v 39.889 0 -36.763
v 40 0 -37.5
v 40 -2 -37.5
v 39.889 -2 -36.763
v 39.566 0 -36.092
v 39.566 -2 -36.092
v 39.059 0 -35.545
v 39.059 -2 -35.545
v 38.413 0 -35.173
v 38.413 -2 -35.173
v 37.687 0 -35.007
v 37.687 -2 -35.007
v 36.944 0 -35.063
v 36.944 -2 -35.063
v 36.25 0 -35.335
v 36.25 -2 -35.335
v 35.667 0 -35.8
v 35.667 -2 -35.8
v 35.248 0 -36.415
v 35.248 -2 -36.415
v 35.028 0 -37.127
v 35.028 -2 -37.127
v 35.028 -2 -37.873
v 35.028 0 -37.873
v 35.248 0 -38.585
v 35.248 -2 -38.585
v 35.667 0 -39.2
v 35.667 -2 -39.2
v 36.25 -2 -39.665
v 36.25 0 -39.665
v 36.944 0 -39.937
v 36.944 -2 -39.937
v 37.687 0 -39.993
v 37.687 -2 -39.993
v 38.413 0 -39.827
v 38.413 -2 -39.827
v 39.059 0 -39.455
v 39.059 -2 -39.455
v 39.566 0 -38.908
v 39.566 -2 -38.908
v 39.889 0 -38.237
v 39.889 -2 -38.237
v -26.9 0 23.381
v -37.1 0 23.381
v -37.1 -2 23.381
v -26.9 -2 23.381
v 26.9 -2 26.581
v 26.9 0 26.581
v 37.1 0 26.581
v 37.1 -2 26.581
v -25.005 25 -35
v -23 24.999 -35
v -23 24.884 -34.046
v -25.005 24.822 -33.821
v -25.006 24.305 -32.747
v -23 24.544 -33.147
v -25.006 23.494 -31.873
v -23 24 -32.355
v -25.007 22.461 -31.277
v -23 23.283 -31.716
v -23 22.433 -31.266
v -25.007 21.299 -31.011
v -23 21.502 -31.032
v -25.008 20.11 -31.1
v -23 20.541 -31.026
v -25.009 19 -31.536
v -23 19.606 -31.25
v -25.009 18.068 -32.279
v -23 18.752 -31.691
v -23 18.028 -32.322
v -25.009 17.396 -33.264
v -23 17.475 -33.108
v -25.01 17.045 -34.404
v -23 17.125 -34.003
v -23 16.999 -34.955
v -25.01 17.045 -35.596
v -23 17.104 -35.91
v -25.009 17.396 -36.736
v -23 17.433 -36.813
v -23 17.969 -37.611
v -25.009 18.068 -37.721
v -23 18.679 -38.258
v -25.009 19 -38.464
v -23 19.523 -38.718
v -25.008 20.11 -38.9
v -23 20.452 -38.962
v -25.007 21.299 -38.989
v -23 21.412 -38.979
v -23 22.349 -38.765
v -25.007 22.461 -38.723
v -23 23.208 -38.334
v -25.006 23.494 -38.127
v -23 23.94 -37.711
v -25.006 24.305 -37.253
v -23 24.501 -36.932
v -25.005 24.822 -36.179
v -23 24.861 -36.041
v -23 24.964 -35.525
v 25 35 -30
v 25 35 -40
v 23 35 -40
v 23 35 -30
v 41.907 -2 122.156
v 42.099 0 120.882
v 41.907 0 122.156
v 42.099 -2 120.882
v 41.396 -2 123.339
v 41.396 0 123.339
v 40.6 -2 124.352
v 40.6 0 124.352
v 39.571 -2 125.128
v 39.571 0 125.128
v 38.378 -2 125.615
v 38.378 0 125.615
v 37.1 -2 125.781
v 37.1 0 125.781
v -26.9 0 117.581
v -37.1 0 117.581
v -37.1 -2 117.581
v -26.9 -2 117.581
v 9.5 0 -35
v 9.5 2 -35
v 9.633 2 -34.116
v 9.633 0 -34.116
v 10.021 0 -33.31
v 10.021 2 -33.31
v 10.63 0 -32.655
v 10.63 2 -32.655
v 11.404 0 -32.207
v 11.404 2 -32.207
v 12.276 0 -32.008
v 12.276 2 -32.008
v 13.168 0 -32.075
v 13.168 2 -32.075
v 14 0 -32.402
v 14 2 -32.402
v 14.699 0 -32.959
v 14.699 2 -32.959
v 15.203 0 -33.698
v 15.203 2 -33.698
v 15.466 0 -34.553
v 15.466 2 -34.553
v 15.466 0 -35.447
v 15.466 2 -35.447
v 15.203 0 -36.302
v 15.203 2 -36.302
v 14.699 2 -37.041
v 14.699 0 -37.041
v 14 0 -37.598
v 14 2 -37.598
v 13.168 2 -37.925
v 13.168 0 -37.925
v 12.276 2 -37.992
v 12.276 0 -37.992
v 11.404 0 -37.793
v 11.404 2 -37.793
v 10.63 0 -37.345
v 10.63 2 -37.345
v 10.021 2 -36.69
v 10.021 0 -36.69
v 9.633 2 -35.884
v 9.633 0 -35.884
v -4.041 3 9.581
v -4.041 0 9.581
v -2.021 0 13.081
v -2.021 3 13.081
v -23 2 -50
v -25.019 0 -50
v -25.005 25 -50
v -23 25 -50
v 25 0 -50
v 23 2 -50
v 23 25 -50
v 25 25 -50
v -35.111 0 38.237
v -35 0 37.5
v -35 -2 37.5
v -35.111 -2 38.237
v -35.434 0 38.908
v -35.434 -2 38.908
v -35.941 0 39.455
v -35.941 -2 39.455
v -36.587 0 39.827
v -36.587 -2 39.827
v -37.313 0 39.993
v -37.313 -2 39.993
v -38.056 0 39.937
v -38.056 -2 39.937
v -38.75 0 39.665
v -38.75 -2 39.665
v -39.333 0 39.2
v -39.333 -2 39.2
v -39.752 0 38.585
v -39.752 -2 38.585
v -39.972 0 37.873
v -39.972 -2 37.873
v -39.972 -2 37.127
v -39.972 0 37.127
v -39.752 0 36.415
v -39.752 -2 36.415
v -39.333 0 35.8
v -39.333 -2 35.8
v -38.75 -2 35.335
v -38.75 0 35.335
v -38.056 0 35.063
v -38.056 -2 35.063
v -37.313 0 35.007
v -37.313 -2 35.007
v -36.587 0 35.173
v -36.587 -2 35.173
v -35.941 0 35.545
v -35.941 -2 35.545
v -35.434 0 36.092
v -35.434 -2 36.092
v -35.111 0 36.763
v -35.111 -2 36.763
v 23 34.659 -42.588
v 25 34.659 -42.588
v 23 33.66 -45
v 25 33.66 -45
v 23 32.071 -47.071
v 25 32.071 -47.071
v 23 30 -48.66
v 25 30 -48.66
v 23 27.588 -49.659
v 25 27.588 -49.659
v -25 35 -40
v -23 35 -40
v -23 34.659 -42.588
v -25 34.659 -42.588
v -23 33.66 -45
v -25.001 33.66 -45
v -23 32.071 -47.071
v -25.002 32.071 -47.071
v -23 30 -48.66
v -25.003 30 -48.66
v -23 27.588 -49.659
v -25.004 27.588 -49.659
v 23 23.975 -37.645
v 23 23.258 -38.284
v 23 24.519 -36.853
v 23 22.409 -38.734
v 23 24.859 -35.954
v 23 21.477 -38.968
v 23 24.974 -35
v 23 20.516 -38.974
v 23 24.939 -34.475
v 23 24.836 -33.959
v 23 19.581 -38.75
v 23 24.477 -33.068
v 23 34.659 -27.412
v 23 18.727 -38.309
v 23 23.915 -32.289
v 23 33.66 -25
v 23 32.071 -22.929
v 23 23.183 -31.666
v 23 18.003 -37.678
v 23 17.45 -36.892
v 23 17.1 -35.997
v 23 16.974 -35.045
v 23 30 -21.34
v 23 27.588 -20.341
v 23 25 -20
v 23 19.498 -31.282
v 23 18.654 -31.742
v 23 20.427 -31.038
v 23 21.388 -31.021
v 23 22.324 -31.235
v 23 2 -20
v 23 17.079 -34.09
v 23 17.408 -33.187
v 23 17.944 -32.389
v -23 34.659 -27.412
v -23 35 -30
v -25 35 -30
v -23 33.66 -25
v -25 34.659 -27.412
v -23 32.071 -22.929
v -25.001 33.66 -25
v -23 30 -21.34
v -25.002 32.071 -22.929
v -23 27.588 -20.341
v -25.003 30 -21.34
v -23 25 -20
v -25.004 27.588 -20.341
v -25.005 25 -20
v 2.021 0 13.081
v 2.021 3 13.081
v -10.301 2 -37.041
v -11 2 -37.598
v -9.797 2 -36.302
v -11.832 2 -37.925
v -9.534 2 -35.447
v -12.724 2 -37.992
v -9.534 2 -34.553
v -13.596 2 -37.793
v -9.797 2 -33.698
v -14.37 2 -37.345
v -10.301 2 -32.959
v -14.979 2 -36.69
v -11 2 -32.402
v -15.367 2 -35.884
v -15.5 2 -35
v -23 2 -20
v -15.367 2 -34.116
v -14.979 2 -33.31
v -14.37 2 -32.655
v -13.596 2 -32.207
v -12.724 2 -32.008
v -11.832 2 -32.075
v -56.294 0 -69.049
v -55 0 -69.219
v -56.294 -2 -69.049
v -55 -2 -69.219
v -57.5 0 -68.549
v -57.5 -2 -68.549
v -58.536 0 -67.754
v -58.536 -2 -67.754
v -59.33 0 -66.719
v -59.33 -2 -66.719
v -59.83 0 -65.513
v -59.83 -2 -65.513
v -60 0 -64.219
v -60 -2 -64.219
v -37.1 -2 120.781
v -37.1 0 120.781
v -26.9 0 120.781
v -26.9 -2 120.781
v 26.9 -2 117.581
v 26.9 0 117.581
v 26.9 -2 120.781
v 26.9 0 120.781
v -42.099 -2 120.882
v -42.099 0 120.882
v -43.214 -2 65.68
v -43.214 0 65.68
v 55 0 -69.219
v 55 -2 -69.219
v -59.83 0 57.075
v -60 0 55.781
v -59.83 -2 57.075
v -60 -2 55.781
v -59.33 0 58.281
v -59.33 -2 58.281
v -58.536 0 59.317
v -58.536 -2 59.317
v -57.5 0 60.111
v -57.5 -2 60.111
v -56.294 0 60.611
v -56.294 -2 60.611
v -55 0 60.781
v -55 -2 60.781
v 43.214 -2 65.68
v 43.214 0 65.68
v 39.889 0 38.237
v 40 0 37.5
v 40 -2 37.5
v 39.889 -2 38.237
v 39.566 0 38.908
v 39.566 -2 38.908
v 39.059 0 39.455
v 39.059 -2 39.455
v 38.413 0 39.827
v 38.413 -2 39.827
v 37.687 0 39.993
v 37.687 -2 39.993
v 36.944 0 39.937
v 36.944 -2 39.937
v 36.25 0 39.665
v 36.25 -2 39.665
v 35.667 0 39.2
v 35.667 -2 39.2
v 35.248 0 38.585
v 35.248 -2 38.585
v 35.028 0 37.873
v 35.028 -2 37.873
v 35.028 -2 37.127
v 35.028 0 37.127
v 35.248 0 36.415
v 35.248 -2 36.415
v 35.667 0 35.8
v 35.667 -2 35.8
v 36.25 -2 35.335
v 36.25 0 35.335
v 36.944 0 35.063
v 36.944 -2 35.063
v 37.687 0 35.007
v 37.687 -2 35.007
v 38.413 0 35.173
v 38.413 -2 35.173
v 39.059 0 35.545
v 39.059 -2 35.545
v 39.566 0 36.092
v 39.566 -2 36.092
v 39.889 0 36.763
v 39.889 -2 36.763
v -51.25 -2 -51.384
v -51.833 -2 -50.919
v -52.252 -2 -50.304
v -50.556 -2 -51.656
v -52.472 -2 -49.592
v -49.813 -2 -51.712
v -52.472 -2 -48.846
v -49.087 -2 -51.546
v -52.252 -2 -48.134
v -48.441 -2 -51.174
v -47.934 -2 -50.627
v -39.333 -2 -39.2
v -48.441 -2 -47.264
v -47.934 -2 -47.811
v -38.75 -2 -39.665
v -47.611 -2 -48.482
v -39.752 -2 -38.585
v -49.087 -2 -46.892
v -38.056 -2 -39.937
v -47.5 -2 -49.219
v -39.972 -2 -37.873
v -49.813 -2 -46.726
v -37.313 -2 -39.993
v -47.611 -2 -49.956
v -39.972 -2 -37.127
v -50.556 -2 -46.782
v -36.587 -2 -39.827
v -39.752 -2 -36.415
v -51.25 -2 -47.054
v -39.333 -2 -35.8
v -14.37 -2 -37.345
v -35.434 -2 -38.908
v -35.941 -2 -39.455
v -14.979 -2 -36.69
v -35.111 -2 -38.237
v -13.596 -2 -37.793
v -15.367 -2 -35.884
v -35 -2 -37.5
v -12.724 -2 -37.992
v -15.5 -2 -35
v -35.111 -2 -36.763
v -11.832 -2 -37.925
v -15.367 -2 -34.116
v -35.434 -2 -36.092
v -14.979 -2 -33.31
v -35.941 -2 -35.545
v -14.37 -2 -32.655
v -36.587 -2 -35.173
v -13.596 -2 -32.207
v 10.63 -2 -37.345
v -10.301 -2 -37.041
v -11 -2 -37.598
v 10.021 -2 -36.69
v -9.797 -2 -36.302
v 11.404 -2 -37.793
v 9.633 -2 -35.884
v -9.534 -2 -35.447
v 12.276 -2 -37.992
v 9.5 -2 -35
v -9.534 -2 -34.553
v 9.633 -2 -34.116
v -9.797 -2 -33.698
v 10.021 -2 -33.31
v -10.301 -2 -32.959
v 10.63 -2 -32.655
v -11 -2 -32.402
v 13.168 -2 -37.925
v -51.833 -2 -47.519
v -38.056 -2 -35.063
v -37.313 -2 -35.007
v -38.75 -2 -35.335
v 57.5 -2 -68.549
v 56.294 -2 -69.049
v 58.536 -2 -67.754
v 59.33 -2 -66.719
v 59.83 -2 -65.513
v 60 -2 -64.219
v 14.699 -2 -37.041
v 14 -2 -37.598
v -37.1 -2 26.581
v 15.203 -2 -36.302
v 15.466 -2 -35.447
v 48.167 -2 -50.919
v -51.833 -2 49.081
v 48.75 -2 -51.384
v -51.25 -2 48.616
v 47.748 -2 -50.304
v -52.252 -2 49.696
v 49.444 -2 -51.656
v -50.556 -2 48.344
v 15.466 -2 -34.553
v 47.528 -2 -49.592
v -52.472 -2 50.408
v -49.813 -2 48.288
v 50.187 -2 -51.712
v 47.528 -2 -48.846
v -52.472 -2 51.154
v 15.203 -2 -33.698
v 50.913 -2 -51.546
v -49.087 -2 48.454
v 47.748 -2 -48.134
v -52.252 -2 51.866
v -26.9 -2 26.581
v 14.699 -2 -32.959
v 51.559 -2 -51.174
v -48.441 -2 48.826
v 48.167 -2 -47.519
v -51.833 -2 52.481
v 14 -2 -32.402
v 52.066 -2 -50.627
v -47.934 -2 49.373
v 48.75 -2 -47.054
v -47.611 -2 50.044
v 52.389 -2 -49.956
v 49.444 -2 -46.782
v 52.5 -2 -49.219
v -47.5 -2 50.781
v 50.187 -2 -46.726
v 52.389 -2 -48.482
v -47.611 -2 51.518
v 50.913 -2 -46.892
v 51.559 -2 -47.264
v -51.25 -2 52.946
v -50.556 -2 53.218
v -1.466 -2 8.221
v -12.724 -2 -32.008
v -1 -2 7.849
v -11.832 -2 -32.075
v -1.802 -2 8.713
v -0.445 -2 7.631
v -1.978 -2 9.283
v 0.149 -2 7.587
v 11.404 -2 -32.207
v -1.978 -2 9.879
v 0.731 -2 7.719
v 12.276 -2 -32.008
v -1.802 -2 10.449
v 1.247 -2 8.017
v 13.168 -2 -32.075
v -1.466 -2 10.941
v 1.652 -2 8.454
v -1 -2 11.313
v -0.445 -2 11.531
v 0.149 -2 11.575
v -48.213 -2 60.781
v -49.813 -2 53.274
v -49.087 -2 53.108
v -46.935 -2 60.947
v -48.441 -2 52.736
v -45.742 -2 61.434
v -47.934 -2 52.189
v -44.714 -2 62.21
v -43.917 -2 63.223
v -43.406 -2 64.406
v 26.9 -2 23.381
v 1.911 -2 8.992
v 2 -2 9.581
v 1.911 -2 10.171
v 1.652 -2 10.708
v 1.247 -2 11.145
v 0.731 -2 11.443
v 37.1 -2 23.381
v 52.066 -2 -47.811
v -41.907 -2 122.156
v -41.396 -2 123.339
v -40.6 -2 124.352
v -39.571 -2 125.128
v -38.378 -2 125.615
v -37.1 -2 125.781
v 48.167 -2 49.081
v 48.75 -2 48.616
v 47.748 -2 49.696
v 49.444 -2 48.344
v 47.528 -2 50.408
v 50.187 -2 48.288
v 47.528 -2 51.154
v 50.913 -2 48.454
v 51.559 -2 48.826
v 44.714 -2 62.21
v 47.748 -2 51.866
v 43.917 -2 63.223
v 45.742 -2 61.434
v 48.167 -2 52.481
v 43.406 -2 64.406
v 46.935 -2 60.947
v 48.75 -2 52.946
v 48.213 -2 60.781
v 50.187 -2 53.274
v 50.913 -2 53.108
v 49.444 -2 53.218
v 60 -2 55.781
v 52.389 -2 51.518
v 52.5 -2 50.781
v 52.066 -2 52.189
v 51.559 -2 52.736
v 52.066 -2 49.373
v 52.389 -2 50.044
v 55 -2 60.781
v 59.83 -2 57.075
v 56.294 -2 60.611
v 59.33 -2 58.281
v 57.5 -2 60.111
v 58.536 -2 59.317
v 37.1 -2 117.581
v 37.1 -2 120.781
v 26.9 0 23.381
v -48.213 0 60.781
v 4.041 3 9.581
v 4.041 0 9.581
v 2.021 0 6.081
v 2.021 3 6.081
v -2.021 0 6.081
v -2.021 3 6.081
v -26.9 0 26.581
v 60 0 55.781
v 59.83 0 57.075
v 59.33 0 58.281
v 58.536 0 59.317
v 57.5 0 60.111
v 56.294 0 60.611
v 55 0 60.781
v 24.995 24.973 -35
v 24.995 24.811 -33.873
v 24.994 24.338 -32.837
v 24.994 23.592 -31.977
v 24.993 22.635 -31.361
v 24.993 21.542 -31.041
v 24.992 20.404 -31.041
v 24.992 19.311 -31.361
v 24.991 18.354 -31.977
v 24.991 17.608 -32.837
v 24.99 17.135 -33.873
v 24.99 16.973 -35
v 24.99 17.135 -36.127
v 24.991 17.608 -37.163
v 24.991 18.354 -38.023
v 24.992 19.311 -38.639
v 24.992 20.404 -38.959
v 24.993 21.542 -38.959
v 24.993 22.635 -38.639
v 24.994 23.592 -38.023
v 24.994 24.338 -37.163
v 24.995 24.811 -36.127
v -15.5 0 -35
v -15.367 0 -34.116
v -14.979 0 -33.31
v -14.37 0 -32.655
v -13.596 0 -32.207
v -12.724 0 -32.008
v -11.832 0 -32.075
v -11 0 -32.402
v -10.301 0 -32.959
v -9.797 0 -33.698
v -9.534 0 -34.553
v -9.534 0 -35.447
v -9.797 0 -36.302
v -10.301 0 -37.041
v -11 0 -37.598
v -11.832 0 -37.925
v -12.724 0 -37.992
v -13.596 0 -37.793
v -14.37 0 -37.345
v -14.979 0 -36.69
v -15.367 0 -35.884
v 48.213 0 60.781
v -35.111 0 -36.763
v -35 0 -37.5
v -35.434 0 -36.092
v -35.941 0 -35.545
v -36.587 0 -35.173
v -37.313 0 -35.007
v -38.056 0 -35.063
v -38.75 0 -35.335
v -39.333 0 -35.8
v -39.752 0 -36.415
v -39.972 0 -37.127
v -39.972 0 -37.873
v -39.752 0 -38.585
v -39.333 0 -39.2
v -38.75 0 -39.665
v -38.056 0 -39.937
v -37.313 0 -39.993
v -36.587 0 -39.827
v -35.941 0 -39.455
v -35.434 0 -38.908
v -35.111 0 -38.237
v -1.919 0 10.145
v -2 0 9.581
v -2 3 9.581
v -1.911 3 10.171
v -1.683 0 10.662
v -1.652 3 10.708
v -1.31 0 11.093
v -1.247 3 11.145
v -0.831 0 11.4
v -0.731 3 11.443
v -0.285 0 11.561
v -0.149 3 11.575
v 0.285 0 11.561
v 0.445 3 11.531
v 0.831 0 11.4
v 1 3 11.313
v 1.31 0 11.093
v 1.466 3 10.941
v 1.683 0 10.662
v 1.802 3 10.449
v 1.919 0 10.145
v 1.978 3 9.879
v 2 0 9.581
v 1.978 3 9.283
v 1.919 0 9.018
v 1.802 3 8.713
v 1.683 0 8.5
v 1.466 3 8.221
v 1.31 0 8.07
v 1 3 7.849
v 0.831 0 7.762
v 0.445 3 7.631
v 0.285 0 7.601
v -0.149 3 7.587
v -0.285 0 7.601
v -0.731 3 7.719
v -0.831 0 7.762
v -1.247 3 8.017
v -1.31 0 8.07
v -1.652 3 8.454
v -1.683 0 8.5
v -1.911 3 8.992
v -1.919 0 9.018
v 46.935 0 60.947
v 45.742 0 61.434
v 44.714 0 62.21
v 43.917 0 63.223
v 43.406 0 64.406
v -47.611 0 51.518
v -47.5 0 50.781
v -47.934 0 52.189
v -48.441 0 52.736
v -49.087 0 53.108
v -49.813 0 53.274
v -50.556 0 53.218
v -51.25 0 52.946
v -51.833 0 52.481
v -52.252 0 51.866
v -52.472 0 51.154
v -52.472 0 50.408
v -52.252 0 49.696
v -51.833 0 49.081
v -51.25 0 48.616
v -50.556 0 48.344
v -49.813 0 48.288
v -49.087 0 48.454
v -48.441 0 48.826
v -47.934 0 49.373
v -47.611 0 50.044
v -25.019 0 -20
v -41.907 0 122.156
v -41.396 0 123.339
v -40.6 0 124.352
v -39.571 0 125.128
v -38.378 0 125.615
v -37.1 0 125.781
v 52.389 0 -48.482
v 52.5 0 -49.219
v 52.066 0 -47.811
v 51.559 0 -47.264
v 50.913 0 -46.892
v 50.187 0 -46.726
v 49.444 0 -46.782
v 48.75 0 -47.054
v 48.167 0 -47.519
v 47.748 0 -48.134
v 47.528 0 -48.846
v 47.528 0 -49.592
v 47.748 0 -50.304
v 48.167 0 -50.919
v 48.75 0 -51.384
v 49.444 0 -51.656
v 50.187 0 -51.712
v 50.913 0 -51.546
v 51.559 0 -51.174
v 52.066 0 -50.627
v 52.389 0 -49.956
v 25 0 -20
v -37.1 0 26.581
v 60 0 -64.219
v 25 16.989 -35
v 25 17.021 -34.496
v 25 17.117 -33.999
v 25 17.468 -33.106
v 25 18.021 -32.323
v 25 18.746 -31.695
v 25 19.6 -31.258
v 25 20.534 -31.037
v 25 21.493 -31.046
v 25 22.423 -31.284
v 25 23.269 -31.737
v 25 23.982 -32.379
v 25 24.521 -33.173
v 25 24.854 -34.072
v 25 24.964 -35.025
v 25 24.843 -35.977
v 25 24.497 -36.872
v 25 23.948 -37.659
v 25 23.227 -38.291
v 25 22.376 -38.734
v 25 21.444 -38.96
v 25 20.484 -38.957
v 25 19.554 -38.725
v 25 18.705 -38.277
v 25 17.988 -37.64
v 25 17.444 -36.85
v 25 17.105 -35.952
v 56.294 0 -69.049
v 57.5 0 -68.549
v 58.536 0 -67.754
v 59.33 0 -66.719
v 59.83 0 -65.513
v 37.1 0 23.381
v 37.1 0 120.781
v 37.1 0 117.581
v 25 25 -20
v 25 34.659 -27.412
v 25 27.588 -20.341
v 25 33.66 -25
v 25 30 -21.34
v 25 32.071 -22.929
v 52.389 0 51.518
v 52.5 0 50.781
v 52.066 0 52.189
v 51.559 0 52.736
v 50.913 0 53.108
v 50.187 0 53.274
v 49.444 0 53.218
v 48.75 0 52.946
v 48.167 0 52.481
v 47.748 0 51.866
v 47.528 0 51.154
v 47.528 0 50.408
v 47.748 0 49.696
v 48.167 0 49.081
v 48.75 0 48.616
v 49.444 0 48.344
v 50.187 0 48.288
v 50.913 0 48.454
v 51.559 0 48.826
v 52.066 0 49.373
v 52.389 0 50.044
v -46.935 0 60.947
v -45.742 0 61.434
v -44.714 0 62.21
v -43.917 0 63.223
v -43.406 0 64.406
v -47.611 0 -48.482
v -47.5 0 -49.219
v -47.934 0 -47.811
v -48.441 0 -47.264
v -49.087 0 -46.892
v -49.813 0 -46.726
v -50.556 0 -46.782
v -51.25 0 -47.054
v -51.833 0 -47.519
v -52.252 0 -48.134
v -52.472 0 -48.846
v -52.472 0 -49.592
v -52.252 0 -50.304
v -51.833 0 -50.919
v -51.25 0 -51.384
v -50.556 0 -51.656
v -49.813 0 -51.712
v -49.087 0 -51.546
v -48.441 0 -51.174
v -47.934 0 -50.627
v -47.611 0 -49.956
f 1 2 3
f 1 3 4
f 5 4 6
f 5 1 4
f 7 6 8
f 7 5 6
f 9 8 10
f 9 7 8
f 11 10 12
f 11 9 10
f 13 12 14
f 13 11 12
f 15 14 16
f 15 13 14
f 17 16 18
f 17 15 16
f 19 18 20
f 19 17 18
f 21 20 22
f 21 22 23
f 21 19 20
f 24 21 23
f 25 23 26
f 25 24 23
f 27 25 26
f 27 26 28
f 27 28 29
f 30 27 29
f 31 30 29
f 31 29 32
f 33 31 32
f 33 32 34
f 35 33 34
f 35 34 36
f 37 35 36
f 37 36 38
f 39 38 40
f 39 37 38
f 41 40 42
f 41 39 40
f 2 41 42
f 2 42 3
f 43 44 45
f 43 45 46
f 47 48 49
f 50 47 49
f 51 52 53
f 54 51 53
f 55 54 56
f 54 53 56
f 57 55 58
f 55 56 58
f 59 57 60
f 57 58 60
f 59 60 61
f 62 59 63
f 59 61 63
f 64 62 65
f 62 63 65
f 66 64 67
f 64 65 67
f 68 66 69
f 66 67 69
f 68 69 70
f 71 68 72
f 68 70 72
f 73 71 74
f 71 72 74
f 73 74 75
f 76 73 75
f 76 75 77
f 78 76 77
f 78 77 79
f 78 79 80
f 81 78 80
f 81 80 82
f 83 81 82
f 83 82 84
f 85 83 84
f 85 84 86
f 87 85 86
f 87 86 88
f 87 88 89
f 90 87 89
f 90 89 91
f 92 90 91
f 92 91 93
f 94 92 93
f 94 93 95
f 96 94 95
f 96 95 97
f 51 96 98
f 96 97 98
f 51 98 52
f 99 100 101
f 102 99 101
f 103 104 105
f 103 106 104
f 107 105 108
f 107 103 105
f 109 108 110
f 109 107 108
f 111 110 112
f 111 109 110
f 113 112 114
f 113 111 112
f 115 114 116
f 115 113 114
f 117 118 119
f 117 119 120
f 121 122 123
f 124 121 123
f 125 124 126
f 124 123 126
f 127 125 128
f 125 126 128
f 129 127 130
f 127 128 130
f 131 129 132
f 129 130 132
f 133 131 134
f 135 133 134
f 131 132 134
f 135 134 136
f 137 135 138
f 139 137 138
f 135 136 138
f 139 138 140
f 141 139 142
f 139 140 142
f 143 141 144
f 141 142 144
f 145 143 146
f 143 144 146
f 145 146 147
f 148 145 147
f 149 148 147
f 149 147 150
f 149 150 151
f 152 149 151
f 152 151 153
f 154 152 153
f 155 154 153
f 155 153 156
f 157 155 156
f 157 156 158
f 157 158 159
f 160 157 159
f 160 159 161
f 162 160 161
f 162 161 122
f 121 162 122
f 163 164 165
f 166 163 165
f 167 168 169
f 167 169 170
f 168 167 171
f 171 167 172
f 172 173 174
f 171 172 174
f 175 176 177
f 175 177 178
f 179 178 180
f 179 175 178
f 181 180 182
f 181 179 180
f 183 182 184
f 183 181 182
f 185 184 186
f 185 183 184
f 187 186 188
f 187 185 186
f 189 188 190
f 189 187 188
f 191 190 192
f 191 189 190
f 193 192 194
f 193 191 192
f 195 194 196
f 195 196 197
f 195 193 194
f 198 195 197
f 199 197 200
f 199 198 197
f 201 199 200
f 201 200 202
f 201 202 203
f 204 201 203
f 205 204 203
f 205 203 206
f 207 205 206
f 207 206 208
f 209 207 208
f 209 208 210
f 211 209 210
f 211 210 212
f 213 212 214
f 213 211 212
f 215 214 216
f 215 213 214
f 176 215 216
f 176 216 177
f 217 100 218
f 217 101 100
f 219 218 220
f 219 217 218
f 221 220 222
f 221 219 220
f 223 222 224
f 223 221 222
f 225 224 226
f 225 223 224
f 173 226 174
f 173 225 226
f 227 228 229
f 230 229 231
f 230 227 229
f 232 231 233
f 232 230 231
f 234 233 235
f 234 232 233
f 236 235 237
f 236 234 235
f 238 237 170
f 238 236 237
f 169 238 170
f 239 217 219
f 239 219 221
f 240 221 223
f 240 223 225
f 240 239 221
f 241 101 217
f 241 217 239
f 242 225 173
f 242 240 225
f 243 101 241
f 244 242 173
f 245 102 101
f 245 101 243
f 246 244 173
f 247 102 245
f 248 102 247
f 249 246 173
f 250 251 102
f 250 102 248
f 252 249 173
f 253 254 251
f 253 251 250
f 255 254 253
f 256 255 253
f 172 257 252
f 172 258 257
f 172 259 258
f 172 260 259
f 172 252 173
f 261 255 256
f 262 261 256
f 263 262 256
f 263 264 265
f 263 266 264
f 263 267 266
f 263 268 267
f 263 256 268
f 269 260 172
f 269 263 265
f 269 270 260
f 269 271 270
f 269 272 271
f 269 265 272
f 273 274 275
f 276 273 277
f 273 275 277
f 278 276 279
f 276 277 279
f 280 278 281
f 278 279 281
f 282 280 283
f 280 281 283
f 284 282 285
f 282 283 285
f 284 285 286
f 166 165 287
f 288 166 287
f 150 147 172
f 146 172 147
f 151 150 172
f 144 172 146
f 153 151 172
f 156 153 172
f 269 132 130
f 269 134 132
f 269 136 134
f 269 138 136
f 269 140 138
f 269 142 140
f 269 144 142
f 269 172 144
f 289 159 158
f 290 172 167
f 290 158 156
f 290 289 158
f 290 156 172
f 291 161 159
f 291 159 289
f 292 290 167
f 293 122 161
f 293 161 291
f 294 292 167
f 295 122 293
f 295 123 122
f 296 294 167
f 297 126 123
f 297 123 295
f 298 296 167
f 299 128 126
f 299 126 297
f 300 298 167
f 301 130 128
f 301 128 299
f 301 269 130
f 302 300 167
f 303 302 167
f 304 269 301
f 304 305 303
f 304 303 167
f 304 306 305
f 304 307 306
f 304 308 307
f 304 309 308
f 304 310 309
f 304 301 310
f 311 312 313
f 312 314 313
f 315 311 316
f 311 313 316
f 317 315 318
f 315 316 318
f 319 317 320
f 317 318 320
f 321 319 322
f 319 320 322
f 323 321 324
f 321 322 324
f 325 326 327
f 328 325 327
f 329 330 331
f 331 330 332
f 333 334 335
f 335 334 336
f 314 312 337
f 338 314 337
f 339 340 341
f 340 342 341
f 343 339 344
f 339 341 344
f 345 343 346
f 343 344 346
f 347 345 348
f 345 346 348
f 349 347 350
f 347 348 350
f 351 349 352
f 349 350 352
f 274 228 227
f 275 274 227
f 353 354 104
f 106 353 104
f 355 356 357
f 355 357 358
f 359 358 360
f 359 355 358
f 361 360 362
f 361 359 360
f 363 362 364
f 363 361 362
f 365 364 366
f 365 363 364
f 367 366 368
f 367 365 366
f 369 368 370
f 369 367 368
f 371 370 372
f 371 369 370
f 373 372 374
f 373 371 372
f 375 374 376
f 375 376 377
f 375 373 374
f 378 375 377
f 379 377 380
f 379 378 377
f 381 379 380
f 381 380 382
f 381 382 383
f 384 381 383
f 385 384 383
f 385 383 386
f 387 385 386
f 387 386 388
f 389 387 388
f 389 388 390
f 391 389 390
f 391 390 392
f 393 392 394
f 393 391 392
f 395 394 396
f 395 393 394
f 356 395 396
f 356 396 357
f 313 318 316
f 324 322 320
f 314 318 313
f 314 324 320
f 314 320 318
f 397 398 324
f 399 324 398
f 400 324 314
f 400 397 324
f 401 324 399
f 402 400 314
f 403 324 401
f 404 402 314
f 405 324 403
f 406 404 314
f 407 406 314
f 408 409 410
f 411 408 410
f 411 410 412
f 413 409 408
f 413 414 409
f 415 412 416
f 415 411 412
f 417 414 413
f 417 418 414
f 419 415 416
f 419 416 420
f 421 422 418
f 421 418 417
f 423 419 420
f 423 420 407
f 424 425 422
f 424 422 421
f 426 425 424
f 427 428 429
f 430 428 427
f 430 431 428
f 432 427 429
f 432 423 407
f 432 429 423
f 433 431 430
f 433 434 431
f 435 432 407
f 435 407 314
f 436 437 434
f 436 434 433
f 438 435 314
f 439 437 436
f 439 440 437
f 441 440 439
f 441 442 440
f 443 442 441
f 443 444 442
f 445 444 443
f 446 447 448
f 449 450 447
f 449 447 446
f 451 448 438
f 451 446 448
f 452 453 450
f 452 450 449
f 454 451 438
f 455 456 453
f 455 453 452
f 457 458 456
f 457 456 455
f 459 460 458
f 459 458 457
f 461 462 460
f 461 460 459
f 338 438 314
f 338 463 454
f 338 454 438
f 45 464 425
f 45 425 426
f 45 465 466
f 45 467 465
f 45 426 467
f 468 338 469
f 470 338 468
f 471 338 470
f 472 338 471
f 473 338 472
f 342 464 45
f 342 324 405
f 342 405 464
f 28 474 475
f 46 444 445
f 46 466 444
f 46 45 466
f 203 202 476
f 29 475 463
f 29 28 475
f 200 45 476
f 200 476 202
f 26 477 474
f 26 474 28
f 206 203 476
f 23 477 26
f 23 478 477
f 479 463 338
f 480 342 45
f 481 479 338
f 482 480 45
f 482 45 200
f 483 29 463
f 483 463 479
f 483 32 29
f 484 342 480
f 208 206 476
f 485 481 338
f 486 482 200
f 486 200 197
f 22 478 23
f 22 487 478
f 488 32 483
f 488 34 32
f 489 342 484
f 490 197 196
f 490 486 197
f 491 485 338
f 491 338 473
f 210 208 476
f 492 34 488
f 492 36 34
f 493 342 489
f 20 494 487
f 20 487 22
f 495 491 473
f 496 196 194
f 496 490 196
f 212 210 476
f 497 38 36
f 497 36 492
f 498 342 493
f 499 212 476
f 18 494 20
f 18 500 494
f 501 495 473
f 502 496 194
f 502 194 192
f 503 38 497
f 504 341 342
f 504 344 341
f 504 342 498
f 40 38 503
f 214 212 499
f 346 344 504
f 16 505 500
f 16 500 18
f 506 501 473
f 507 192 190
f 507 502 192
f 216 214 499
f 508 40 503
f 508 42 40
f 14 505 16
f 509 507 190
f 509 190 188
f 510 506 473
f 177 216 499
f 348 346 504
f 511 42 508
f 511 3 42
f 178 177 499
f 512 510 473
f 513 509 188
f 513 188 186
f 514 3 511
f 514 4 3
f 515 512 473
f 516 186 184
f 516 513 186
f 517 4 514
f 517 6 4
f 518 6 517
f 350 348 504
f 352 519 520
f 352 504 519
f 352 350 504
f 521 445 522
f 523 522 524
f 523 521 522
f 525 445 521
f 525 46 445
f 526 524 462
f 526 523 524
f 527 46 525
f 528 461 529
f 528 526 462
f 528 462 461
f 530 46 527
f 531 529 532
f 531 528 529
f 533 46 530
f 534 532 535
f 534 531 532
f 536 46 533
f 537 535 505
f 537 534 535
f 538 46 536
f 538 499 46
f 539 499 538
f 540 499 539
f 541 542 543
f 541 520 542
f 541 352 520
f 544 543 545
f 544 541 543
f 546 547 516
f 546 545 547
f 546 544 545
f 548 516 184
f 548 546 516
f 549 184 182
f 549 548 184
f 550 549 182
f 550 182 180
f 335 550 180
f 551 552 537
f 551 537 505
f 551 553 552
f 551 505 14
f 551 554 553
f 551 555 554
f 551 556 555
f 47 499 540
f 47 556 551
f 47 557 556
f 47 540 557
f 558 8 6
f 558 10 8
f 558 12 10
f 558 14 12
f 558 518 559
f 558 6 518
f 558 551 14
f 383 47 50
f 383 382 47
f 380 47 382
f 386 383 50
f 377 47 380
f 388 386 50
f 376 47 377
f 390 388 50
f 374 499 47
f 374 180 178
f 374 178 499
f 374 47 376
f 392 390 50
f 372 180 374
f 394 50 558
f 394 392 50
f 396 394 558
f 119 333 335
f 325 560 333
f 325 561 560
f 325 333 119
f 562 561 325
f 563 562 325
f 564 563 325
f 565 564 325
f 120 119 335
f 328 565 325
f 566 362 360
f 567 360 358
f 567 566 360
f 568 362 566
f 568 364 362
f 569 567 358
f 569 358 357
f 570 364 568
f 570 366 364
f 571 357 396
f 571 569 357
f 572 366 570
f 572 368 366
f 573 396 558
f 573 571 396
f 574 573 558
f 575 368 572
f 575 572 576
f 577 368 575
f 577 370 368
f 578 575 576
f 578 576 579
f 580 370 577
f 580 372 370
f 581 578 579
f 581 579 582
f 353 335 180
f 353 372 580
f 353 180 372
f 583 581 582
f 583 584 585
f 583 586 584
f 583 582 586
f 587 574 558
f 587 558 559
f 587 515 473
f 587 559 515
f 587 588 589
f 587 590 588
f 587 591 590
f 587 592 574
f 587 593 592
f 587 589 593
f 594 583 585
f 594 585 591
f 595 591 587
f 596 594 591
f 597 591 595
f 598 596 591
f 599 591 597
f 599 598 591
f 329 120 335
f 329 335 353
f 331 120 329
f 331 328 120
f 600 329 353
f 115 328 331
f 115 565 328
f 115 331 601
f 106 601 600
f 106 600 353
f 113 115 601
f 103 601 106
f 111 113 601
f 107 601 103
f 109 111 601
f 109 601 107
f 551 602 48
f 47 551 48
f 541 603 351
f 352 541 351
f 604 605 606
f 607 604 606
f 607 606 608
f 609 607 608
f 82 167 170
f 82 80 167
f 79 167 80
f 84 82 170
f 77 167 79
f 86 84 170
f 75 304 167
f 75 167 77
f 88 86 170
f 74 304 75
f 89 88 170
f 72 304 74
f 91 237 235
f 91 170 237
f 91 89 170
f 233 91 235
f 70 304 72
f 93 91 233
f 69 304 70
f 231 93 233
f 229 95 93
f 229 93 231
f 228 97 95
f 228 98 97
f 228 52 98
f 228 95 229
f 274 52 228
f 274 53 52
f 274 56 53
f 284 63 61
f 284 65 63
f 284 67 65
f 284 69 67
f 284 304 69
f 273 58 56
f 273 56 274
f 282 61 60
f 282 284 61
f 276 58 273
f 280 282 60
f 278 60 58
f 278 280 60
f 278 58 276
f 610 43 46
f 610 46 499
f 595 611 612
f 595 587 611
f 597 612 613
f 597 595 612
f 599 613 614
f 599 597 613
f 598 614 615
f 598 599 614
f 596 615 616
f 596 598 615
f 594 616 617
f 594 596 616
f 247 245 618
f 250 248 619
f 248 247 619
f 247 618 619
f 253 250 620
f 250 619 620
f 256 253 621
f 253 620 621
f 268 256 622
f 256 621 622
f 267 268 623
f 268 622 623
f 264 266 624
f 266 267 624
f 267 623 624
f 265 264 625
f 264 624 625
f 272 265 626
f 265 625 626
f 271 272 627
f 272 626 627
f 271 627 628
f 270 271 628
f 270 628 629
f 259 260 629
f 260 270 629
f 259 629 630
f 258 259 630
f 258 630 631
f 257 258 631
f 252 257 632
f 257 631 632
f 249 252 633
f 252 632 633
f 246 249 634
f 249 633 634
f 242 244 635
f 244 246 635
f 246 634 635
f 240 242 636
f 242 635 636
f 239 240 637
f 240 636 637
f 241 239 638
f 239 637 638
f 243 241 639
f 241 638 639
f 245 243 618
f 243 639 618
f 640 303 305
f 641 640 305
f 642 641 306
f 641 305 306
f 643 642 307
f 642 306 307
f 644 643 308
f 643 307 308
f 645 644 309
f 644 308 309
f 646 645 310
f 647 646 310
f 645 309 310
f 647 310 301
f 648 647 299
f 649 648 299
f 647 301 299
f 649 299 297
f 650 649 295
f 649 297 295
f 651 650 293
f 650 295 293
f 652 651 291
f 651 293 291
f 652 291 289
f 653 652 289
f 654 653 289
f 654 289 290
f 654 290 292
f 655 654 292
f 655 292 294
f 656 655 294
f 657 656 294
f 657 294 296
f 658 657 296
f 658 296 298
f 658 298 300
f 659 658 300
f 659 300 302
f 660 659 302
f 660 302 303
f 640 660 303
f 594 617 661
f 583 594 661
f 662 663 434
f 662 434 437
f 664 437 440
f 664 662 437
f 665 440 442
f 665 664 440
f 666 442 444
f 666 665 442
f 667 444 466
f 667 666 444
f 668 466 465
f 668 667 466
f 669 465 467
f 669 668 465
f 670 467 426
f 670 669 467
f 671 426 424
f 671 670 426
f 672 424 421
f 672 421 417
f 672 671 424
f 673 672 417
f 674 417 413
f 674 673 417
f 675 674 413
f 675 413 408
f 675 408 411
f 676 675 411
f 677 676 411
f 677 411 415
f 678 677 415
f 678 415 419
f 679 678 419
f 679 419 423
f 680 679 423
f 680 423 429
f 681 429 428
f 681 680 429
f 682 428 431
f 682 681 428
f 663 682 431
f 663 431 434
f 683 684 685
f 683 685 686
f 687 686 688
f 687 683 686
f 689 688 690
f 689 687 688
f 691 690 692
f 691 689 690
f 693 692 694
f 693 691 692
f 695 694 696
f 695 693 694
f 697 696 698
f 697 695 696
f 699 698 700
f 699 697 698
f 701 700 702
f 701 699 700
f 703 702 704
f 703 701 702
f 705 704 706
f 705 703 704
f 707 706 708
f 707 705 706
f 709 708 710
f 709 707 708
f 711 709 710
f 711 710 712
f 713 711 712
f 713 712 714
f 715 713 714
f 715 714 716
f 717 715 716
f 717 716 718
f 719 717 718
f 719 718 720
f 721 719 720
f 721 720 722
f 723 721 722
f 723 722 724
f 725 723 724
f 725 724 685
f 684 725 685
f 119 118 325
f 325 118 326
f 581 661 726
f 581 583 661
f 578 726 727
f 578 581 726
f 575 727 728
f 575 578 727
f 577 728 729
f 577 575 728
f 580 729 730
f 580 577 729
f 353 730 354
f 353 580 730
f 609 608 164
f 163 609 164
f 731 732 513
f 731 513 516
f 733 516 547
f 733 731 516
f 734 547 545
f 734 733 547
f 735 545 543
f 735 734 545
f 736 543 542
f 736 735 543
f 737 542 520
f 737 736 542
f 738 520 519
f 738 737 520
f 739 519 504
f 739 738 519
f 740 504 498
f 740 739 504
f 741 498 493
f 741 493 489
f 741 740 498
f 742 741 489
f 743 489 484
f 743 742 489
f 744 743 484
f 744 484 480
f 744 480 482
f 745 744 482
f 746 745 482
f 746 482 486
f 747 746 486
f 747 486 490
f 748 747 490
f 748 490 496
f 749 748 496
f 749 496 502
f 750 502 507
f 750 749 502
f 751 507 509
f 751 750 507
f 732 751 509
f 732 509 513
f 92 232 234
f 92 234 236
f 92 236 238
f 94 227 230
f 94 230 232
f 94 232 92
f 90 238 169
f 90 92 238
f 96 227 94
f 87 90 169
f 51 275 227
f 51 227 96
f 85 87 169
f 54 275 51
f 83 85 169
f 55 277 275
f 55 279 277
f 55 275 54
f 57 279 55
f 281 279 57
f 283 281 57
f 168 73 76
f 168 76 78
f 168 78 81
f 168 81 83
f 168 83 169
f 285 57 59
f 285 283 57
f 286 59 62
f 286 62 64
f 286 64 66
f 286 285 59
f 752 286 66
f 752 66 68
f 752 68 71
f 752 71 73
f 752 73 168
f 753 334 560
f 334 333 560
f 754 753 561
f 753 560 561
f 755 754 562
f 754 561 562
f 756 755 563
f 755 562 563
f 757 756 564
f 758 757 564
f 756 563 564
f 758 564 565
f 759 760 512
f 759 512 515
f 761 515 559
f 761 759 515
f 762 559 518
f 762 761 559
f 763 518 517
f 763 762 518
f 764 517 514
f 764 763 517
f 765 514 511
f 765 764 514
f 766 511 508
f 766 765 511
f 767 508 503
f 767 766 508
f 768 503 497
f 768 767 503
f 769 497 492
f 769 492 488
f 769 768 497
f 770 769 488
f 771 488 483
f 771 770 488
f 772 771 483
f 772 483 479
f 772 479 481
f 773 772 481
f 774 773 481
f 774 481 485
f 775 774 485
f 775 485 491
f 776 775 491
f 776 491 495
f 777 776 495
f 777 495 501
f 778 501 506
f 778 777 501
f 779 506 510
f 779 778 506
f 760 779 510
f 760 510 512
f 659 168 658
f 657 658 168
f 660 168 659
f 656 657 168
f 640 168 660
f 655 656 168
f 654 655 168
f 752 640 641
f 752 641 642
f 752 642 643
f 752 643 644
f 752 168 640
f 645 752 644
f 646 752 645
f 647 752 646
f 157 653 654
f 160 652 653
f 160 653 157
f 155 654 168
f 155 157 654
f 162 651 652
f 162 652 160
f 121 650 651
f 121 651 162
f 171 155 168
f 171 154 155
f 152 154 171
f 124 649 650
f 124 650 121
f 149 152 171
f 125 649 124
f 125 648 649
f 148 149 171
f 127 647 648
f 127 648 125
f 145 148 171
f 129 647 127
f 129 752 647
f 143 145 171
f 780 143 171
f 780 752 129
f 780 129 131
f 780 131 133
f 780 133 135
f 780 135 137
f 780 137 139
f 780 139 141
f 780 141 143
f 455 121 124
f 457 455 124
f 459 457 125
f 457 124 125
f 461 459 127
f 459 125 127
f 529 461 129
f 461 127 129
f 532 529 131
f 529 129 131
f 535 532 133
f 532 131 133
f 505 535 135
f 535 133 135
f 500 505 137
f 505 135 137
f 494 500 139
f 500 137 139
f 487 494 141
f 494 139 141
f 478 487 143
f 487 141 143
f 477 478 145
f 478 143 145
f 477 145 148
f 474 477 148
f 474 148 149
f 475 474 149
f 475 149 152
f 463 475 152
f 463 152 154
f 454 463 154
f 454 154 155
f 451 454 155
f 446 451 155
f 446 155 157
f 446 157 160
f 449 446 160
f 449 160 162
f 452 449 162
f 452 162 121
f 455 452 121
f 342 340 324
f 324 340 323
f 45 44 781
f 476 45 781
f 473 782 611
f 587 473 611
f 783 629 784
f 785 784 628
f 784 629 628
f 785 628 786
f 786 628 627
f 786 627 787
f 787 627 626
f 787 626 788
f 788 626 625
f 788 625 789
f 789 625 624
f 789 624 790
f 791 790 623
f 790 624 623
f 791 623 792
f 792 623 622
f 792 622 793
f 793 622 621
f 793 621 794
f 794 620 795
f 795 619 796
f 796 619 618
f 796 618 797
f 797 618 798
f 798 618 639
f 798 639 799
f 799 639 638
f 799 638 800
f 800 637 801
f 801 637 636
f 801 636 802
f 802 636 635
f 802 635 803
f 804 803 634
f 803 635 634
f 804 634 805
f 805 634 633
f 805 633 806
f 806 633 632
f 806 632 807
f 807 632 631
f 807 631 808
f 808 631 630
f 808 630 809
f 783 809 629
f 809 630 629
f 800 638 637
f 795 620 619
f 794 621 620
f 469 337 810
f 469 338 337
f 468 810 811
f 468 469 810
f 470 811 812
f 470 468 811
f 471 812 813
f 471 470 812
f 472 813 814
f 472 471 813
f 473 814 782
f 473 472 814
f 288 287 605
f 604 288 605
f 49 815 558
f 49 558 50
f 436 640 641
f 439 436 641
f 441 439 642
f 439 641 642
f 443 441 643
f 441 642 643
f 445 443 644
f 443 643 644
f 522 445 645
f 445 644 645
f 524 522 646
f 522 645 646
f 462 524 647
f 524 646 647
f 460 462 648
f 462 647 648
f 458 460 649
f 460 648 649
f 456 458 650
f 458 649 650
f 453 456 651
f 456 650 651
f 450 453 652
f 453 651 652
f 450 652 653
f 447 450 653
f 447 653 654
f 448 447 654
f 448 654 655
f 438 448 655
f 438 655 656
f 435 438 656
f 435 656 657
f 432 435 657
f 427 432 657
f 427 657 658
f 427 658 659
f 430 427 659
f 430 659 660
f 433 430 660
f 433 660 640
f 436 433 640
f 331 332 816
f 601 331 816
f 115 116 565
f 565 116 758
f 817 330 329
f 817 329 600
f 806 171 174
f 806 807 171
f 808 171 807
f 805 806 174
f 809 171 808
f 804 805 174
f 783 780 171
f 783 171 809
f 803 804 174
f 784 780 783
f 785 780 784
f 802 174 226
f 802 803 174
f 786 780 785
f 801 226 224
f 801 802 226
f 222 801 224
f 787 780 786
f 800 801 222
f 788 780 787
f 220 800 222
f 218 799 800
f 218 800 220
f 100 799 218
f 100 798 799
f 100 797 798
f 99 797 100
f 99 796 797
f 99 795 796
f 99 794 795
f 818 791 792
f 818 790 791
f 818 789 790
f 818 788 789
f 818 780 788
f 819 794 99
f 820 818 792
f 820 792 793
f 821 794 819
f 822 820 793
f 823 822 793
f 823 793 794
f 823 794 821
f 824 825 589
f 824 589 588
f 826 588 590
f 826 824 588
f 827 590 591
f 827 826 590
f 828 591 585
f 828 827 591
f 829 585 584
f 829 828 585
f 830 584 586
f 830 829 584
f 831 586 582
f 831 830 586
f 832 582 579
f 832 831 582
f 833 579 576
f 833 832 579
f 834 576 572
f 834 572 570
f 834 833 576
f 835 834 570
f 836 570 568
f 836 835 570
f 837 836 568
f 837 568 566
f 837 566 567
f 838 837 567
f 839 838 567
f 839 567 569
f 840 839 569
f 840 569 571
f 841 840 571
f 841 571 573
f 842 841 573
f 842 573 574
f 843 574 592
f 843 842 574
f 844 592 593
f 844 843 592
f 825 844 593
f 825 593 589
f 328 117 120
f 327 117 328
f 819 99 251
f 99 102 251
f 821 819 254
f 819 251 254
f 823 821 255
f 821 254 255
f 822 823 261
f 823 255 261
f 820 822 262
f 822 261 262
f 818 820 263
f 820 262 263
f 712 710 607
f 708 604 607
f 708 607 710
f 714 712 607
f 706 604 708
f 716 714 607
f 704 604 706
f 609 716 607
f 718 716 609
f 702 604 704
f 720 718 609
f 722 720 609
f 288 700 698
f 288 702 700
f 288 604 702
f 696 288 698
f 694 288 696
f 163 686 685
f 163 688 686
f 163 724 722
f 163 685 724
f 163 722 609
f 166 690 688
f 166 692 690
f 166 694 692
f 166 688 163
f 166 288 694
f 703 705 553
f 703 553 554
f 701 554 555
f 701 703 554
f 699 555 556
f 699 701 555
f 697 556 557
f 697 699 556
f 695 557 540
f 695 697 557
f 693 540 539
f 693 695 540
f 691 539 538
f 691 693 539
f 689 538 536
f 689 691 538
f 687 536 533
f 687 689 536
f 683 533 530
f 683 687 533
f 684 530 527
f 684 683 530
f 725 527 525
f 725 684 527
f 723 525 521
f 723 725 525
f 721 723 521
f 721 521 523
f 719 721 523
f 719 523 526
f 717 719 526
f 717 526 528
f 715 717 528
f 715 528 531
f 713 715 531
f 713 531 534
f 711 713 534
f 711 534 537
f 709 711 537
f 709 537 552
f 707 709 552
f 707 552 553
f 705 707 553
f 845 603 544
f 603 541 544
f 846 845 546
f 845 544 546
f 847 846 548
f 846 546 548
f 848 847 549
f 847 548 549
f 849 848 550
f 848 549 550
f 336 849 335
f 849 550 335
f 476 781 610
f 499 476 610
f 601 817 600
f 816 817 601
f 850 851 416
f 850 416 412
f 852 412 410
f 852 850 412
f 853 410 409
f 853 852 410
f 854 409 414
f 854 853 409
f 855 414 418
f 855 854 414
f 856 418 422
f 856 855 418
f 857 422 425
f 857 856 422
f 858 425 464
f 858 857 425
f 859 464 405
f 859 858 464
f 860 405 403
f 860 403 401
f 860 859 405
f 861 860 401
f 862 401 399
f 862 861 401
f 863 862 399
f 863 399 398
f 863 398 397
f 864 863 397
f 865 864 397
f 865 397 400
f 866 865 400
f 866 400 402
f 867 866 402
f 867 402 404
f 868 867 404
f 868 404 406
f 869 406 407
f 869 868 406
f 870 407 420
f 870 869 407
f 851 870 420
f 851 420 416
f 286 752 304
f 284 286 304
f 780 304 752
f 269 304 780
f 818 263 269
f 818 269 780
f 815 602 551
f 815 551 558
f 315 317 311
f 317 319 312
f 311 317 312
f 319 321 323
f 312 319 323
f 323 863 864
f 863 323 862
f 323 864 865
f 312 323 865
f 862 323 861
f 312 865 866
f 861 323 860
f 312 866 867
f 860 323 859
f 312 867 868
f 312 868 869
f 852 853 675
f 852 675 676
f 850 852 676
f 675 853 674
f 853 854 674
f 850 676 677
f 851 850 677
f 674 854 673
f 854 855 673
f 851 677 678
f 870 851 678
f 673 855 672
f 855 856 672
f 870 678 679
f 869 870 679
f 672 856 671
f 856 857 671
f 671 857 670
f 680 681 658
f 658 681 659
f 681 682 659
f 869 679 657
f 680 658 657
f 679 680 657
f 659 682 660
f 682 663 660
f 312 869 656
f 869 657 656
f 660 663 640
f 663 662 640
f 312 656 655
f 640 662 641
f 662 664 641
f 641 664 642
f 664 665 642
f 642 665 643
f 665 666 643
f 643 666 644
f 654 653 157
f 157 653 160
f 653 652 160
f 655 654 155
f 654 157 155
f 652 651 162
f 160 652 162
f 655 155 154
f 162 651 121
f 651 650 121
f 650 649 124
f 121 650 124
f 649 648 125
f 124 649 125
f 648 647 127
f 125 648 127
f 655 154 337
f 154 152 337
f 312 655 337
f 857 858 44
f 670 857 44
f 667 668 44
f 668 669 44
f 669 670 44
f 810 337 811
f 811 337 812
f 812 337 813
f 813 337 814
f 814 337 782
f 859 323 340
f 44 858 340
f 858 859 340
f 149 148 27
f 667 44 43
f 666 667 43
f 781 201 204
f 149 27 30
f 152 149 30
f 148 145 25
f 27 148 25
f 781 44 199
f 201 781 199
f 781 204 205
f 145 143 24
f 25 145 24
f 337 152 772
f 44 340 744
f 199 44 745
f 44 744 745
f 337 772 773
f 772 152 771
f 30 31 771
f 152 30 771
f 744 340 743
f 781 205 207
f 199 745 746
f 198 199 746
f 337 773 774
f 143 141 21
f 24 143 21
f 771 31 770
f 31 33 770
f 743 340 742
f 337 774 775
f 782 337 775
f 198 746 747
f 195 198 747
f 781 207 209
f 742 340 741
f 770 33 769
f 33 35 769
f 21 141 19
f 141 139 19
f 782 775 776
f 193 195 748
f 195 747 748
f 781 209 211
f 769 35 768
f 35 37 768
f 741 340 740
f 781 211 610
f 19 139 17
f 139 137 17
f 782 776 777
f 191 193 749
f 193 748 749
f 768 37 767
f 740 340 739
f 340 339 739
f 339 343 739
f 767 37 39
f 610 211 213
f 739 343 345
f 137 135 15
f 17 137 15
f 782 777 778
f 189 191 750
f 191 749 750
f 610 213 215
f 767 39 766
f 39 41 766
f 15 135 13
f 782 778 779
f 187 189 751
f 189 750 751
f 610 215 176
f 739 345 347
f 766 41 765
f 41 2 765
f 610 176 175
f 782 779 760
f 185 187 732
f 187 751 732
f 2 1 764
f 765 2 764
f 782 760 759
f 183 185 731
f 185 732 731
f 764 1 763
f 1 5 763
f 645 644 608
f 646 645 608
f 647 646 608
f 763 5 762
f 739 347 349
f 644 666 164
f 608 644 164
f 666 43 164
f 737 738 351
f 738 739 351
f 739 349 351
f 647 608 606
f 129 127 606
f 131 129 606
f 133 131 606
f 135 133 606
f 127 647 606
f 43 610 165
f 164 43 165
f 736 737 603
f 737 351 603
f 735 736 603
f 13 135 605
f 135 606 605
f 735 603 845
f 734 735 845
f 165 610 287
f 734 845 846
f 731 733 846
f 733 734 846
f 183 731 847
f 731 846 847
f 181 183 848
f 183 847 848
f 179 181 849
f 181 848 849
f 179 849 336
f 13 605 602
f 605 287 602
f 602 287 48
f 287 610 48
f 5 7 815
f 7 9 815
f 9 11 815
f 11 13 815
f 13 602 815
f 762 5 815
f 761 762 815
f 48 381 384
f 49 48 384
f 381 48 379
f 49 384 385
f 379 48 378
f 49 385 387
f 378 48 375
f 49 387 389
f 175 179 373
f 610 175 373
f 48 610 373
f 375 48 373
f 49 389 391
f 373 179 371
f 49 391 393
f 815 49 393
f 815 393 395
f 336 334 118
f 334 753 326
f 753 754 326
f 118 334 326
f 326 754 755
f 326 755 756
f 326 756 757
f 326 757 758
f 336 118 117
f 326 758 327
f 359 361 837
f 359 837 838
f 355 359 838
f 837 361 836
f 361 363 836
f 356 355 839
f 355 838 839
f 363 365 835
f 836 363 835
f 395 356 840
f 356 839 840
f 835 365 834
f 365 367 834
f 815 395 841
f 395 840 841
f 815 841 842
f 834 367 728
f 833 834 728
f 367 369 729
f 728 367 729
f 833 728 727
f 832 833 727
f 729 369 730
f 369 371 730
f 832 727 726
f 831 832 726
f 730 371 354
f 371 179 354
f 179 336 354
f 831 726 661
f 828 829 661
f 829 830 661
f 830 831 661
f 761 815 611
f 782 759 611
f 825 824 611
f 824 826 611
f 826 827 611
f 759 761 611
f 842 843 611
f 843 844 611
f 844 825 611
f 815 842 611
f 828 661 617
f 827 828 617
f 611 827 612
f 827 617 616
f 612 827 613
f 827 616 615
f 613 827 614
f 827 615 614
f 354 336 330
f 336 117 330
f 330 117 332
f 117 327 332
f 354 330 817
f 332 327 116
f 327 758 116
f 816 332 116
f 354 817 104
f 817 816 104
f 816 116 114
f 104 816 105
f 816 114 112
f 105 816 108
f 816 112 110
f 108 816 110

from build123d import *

# Parameters (mm, degrees)
F0_R      = 2.5
F0_W      = 10.2
F0_H      = 3.2
F0_R_2    = 2
F1_DEPTH  = 2
F2_R      = 5
F3_R      = 2
F4_DEPTH  = 3
F7_DEPTH  = 15
F8_R      = 10
F10_D     = 8
F10_DEPTH = 50
F10_TIP   = 2.4034424761
F11_R     = 3
F12_DEPTH = 25


with BuildPart() as f1:
    # F0 (on Front) → F1 (new body)
    with BuildSketch(Plane.XZ):
        Polygon((-60, -69.2189367059), (0, -69.2189367059), (60, -69.2189367059), (60, 60.7810632941), (43.3132653061, 60.7810632941), (42, 125.7810632941), (0, 125.7810632941), (-42, 125.7810632941), (-43.3132653061, 60.7810632941), (-60, 60.7810632941), align=None)
        with Locations((-50, -49.2189367059)):
            Circle(F0_R, mode=Mode.SUBTRACT)
        with Locations((-37.5, -37.5)):
            Circle(F0_R, mode=Mode.SUBTRACT)
        with Locations((-32, 24.9810632941)):
            Rectangle(F0_W, F0_H, mode=Mode.SUBTRACT)
        with Locations((50, -49.2189367059)):
            Circle(F0_R, mode=Mode.SUBTRACT)
        with Locations((37.5, -37.5)):
            Circle(F0_R, mode=Mode.SUBTRACT)
        with Locations((0, 9.5810632941)):
            Circle(F0_R_2, mode=Mode.SUBTRACT)
        with Locations((32, 24.9810632941)):
            Rectangle(F0_W, F0_H, mode=Mode.SUBTRACT)
        with Locations((-50, 50.7810632941)):
            Circle(F0_R, mode=Mode.SUBTRACT)
        with Locations((-37.5, 37.5)):
            Circle(F0_R, mode=Mode.SUBTRACT)
        with Locations((-32, 119.1810632941)):
            Rectangle(F0_W, F0_H, mode=Mode.SUBTRACT)
        with Locations((37.5, 37.5)):
            Circle(F0_R, mode=Mode.SUBTRACT)
        with Locations((50, 50.7810632941)):
            Circle(F0_R, mode=Mode.SUBTRACT)
        with Locations((32, 119.1810632941)):
            Rectangle(F0_W, F0_H, mode=Mode.SUBTRACT)
    extrude(amount=F1_DEPTH)

    # F2
    f2_edges = [f1.edges().sort_by_distance(p)[0] for p in [
        (60, -1, 60.781063),
        (-60, -1, 60.781063),
        (-43.313265, -1, 60.781063),
        (43.313265, -1, 60.781063),
        (42, -1, 125.781063),
        (-42, -1, 125.781063),
        (60, -1, -69.218937),
        (-60, -1, -69.218937),
    ]]
    fillet(f2_edges, radius=F2_R)

    # F3 (on face) → F4 (join)
    with BuildSketch(Plane(origin=(0, 0, 0), x_dir=(-1, 0, 0), z_dir=(0, 1, 0))):
        Polygon((4.0414518843, 9.5810632941), (2.0207259422, 13.0810632941), (-2.0207259422, 13.0810632941), (-4.0414518843, 9.5810632941), (-2.0207259422, 6.0810632941), (2.0207259422, 6.0810632941), align=None)
        with Locations((0, 9.5810632941)):
            Circle(F3_R, mode=Mode.SUBTRACT)
    extrude(amount=F4_DEPTH)


with BuildPart() as f7:
    # F6 (on offset) → F7 (new body, symmetric)
    with BuildSketch(Plane.XY.offset(-35)):
        Polygon((-25.0188405804, 0), (25.0000707743, 0), (25.0000707743, 35), (23.0000707743, 35), (23.0000707743, 2), (-22.9999292257, 2), (-22.9999292257, 34.9999948909), (-24.9999292257, 34.9999948909), align=None)
    extrude(amount=F7_DEPTH, both=True)

    # F8
    f8_edges = [f7.edges().sort_by_distance(p)[0] for p in [
        (24.000071, 35, -20),
        (24.000071, 35, -50),
        (-23.999929, 34.999995, -50),
        (-23.999929, 34.999995, -20),
    ]]
    fillet(f8_edges, radius=F8_R)

    # F10
    with Locations(Plane(origin=(-25.0188332761, 0.0135182885, 0), x_dir=(-0.0005403244, -0.999999854, 0), z_dir=(-0.999999854, 0.0005403244, 0))):
        with Locations((-20.9864817095, -35)):
            Hole(F10_D / 2, depth=F10_DEPTH)
            with Locations((0, 0, -(F10_DEPTH + F10_TIP / 2))):  # 118° drill point
                Cone(0, F10_D / 2, F10_TIP, mode=Mode.SUBTRACT)


with BuildPart() as f12_tool:
    # F11 (on face) → F12 (new body)
    with BuildSketch(Plane(origin=(0, 2, 0), x_dir=(-1, 0, 0), z_dir=(0, 1, 0))):
        with Locations((-12.5, -35)):
            Circle(F11_R)
        with Locations((12.5, -35)):
            Circle(F11_R)
    extrude(amount=-F12_DEPTH)


with BuildPart() as f1_1:
    add(f1.part)

    # F12: cut by f12_tool
    add(f12_tool.part, mode=Mode.SUBTRACT)


with BuildPart() as f7_1:
    add(f7.part)

    # F12: cut by f12_tool
    add(f12_tool.part, mode=Mode.SUBTRACT)


solid = Compound([f1_1.part, f7_1.part])
